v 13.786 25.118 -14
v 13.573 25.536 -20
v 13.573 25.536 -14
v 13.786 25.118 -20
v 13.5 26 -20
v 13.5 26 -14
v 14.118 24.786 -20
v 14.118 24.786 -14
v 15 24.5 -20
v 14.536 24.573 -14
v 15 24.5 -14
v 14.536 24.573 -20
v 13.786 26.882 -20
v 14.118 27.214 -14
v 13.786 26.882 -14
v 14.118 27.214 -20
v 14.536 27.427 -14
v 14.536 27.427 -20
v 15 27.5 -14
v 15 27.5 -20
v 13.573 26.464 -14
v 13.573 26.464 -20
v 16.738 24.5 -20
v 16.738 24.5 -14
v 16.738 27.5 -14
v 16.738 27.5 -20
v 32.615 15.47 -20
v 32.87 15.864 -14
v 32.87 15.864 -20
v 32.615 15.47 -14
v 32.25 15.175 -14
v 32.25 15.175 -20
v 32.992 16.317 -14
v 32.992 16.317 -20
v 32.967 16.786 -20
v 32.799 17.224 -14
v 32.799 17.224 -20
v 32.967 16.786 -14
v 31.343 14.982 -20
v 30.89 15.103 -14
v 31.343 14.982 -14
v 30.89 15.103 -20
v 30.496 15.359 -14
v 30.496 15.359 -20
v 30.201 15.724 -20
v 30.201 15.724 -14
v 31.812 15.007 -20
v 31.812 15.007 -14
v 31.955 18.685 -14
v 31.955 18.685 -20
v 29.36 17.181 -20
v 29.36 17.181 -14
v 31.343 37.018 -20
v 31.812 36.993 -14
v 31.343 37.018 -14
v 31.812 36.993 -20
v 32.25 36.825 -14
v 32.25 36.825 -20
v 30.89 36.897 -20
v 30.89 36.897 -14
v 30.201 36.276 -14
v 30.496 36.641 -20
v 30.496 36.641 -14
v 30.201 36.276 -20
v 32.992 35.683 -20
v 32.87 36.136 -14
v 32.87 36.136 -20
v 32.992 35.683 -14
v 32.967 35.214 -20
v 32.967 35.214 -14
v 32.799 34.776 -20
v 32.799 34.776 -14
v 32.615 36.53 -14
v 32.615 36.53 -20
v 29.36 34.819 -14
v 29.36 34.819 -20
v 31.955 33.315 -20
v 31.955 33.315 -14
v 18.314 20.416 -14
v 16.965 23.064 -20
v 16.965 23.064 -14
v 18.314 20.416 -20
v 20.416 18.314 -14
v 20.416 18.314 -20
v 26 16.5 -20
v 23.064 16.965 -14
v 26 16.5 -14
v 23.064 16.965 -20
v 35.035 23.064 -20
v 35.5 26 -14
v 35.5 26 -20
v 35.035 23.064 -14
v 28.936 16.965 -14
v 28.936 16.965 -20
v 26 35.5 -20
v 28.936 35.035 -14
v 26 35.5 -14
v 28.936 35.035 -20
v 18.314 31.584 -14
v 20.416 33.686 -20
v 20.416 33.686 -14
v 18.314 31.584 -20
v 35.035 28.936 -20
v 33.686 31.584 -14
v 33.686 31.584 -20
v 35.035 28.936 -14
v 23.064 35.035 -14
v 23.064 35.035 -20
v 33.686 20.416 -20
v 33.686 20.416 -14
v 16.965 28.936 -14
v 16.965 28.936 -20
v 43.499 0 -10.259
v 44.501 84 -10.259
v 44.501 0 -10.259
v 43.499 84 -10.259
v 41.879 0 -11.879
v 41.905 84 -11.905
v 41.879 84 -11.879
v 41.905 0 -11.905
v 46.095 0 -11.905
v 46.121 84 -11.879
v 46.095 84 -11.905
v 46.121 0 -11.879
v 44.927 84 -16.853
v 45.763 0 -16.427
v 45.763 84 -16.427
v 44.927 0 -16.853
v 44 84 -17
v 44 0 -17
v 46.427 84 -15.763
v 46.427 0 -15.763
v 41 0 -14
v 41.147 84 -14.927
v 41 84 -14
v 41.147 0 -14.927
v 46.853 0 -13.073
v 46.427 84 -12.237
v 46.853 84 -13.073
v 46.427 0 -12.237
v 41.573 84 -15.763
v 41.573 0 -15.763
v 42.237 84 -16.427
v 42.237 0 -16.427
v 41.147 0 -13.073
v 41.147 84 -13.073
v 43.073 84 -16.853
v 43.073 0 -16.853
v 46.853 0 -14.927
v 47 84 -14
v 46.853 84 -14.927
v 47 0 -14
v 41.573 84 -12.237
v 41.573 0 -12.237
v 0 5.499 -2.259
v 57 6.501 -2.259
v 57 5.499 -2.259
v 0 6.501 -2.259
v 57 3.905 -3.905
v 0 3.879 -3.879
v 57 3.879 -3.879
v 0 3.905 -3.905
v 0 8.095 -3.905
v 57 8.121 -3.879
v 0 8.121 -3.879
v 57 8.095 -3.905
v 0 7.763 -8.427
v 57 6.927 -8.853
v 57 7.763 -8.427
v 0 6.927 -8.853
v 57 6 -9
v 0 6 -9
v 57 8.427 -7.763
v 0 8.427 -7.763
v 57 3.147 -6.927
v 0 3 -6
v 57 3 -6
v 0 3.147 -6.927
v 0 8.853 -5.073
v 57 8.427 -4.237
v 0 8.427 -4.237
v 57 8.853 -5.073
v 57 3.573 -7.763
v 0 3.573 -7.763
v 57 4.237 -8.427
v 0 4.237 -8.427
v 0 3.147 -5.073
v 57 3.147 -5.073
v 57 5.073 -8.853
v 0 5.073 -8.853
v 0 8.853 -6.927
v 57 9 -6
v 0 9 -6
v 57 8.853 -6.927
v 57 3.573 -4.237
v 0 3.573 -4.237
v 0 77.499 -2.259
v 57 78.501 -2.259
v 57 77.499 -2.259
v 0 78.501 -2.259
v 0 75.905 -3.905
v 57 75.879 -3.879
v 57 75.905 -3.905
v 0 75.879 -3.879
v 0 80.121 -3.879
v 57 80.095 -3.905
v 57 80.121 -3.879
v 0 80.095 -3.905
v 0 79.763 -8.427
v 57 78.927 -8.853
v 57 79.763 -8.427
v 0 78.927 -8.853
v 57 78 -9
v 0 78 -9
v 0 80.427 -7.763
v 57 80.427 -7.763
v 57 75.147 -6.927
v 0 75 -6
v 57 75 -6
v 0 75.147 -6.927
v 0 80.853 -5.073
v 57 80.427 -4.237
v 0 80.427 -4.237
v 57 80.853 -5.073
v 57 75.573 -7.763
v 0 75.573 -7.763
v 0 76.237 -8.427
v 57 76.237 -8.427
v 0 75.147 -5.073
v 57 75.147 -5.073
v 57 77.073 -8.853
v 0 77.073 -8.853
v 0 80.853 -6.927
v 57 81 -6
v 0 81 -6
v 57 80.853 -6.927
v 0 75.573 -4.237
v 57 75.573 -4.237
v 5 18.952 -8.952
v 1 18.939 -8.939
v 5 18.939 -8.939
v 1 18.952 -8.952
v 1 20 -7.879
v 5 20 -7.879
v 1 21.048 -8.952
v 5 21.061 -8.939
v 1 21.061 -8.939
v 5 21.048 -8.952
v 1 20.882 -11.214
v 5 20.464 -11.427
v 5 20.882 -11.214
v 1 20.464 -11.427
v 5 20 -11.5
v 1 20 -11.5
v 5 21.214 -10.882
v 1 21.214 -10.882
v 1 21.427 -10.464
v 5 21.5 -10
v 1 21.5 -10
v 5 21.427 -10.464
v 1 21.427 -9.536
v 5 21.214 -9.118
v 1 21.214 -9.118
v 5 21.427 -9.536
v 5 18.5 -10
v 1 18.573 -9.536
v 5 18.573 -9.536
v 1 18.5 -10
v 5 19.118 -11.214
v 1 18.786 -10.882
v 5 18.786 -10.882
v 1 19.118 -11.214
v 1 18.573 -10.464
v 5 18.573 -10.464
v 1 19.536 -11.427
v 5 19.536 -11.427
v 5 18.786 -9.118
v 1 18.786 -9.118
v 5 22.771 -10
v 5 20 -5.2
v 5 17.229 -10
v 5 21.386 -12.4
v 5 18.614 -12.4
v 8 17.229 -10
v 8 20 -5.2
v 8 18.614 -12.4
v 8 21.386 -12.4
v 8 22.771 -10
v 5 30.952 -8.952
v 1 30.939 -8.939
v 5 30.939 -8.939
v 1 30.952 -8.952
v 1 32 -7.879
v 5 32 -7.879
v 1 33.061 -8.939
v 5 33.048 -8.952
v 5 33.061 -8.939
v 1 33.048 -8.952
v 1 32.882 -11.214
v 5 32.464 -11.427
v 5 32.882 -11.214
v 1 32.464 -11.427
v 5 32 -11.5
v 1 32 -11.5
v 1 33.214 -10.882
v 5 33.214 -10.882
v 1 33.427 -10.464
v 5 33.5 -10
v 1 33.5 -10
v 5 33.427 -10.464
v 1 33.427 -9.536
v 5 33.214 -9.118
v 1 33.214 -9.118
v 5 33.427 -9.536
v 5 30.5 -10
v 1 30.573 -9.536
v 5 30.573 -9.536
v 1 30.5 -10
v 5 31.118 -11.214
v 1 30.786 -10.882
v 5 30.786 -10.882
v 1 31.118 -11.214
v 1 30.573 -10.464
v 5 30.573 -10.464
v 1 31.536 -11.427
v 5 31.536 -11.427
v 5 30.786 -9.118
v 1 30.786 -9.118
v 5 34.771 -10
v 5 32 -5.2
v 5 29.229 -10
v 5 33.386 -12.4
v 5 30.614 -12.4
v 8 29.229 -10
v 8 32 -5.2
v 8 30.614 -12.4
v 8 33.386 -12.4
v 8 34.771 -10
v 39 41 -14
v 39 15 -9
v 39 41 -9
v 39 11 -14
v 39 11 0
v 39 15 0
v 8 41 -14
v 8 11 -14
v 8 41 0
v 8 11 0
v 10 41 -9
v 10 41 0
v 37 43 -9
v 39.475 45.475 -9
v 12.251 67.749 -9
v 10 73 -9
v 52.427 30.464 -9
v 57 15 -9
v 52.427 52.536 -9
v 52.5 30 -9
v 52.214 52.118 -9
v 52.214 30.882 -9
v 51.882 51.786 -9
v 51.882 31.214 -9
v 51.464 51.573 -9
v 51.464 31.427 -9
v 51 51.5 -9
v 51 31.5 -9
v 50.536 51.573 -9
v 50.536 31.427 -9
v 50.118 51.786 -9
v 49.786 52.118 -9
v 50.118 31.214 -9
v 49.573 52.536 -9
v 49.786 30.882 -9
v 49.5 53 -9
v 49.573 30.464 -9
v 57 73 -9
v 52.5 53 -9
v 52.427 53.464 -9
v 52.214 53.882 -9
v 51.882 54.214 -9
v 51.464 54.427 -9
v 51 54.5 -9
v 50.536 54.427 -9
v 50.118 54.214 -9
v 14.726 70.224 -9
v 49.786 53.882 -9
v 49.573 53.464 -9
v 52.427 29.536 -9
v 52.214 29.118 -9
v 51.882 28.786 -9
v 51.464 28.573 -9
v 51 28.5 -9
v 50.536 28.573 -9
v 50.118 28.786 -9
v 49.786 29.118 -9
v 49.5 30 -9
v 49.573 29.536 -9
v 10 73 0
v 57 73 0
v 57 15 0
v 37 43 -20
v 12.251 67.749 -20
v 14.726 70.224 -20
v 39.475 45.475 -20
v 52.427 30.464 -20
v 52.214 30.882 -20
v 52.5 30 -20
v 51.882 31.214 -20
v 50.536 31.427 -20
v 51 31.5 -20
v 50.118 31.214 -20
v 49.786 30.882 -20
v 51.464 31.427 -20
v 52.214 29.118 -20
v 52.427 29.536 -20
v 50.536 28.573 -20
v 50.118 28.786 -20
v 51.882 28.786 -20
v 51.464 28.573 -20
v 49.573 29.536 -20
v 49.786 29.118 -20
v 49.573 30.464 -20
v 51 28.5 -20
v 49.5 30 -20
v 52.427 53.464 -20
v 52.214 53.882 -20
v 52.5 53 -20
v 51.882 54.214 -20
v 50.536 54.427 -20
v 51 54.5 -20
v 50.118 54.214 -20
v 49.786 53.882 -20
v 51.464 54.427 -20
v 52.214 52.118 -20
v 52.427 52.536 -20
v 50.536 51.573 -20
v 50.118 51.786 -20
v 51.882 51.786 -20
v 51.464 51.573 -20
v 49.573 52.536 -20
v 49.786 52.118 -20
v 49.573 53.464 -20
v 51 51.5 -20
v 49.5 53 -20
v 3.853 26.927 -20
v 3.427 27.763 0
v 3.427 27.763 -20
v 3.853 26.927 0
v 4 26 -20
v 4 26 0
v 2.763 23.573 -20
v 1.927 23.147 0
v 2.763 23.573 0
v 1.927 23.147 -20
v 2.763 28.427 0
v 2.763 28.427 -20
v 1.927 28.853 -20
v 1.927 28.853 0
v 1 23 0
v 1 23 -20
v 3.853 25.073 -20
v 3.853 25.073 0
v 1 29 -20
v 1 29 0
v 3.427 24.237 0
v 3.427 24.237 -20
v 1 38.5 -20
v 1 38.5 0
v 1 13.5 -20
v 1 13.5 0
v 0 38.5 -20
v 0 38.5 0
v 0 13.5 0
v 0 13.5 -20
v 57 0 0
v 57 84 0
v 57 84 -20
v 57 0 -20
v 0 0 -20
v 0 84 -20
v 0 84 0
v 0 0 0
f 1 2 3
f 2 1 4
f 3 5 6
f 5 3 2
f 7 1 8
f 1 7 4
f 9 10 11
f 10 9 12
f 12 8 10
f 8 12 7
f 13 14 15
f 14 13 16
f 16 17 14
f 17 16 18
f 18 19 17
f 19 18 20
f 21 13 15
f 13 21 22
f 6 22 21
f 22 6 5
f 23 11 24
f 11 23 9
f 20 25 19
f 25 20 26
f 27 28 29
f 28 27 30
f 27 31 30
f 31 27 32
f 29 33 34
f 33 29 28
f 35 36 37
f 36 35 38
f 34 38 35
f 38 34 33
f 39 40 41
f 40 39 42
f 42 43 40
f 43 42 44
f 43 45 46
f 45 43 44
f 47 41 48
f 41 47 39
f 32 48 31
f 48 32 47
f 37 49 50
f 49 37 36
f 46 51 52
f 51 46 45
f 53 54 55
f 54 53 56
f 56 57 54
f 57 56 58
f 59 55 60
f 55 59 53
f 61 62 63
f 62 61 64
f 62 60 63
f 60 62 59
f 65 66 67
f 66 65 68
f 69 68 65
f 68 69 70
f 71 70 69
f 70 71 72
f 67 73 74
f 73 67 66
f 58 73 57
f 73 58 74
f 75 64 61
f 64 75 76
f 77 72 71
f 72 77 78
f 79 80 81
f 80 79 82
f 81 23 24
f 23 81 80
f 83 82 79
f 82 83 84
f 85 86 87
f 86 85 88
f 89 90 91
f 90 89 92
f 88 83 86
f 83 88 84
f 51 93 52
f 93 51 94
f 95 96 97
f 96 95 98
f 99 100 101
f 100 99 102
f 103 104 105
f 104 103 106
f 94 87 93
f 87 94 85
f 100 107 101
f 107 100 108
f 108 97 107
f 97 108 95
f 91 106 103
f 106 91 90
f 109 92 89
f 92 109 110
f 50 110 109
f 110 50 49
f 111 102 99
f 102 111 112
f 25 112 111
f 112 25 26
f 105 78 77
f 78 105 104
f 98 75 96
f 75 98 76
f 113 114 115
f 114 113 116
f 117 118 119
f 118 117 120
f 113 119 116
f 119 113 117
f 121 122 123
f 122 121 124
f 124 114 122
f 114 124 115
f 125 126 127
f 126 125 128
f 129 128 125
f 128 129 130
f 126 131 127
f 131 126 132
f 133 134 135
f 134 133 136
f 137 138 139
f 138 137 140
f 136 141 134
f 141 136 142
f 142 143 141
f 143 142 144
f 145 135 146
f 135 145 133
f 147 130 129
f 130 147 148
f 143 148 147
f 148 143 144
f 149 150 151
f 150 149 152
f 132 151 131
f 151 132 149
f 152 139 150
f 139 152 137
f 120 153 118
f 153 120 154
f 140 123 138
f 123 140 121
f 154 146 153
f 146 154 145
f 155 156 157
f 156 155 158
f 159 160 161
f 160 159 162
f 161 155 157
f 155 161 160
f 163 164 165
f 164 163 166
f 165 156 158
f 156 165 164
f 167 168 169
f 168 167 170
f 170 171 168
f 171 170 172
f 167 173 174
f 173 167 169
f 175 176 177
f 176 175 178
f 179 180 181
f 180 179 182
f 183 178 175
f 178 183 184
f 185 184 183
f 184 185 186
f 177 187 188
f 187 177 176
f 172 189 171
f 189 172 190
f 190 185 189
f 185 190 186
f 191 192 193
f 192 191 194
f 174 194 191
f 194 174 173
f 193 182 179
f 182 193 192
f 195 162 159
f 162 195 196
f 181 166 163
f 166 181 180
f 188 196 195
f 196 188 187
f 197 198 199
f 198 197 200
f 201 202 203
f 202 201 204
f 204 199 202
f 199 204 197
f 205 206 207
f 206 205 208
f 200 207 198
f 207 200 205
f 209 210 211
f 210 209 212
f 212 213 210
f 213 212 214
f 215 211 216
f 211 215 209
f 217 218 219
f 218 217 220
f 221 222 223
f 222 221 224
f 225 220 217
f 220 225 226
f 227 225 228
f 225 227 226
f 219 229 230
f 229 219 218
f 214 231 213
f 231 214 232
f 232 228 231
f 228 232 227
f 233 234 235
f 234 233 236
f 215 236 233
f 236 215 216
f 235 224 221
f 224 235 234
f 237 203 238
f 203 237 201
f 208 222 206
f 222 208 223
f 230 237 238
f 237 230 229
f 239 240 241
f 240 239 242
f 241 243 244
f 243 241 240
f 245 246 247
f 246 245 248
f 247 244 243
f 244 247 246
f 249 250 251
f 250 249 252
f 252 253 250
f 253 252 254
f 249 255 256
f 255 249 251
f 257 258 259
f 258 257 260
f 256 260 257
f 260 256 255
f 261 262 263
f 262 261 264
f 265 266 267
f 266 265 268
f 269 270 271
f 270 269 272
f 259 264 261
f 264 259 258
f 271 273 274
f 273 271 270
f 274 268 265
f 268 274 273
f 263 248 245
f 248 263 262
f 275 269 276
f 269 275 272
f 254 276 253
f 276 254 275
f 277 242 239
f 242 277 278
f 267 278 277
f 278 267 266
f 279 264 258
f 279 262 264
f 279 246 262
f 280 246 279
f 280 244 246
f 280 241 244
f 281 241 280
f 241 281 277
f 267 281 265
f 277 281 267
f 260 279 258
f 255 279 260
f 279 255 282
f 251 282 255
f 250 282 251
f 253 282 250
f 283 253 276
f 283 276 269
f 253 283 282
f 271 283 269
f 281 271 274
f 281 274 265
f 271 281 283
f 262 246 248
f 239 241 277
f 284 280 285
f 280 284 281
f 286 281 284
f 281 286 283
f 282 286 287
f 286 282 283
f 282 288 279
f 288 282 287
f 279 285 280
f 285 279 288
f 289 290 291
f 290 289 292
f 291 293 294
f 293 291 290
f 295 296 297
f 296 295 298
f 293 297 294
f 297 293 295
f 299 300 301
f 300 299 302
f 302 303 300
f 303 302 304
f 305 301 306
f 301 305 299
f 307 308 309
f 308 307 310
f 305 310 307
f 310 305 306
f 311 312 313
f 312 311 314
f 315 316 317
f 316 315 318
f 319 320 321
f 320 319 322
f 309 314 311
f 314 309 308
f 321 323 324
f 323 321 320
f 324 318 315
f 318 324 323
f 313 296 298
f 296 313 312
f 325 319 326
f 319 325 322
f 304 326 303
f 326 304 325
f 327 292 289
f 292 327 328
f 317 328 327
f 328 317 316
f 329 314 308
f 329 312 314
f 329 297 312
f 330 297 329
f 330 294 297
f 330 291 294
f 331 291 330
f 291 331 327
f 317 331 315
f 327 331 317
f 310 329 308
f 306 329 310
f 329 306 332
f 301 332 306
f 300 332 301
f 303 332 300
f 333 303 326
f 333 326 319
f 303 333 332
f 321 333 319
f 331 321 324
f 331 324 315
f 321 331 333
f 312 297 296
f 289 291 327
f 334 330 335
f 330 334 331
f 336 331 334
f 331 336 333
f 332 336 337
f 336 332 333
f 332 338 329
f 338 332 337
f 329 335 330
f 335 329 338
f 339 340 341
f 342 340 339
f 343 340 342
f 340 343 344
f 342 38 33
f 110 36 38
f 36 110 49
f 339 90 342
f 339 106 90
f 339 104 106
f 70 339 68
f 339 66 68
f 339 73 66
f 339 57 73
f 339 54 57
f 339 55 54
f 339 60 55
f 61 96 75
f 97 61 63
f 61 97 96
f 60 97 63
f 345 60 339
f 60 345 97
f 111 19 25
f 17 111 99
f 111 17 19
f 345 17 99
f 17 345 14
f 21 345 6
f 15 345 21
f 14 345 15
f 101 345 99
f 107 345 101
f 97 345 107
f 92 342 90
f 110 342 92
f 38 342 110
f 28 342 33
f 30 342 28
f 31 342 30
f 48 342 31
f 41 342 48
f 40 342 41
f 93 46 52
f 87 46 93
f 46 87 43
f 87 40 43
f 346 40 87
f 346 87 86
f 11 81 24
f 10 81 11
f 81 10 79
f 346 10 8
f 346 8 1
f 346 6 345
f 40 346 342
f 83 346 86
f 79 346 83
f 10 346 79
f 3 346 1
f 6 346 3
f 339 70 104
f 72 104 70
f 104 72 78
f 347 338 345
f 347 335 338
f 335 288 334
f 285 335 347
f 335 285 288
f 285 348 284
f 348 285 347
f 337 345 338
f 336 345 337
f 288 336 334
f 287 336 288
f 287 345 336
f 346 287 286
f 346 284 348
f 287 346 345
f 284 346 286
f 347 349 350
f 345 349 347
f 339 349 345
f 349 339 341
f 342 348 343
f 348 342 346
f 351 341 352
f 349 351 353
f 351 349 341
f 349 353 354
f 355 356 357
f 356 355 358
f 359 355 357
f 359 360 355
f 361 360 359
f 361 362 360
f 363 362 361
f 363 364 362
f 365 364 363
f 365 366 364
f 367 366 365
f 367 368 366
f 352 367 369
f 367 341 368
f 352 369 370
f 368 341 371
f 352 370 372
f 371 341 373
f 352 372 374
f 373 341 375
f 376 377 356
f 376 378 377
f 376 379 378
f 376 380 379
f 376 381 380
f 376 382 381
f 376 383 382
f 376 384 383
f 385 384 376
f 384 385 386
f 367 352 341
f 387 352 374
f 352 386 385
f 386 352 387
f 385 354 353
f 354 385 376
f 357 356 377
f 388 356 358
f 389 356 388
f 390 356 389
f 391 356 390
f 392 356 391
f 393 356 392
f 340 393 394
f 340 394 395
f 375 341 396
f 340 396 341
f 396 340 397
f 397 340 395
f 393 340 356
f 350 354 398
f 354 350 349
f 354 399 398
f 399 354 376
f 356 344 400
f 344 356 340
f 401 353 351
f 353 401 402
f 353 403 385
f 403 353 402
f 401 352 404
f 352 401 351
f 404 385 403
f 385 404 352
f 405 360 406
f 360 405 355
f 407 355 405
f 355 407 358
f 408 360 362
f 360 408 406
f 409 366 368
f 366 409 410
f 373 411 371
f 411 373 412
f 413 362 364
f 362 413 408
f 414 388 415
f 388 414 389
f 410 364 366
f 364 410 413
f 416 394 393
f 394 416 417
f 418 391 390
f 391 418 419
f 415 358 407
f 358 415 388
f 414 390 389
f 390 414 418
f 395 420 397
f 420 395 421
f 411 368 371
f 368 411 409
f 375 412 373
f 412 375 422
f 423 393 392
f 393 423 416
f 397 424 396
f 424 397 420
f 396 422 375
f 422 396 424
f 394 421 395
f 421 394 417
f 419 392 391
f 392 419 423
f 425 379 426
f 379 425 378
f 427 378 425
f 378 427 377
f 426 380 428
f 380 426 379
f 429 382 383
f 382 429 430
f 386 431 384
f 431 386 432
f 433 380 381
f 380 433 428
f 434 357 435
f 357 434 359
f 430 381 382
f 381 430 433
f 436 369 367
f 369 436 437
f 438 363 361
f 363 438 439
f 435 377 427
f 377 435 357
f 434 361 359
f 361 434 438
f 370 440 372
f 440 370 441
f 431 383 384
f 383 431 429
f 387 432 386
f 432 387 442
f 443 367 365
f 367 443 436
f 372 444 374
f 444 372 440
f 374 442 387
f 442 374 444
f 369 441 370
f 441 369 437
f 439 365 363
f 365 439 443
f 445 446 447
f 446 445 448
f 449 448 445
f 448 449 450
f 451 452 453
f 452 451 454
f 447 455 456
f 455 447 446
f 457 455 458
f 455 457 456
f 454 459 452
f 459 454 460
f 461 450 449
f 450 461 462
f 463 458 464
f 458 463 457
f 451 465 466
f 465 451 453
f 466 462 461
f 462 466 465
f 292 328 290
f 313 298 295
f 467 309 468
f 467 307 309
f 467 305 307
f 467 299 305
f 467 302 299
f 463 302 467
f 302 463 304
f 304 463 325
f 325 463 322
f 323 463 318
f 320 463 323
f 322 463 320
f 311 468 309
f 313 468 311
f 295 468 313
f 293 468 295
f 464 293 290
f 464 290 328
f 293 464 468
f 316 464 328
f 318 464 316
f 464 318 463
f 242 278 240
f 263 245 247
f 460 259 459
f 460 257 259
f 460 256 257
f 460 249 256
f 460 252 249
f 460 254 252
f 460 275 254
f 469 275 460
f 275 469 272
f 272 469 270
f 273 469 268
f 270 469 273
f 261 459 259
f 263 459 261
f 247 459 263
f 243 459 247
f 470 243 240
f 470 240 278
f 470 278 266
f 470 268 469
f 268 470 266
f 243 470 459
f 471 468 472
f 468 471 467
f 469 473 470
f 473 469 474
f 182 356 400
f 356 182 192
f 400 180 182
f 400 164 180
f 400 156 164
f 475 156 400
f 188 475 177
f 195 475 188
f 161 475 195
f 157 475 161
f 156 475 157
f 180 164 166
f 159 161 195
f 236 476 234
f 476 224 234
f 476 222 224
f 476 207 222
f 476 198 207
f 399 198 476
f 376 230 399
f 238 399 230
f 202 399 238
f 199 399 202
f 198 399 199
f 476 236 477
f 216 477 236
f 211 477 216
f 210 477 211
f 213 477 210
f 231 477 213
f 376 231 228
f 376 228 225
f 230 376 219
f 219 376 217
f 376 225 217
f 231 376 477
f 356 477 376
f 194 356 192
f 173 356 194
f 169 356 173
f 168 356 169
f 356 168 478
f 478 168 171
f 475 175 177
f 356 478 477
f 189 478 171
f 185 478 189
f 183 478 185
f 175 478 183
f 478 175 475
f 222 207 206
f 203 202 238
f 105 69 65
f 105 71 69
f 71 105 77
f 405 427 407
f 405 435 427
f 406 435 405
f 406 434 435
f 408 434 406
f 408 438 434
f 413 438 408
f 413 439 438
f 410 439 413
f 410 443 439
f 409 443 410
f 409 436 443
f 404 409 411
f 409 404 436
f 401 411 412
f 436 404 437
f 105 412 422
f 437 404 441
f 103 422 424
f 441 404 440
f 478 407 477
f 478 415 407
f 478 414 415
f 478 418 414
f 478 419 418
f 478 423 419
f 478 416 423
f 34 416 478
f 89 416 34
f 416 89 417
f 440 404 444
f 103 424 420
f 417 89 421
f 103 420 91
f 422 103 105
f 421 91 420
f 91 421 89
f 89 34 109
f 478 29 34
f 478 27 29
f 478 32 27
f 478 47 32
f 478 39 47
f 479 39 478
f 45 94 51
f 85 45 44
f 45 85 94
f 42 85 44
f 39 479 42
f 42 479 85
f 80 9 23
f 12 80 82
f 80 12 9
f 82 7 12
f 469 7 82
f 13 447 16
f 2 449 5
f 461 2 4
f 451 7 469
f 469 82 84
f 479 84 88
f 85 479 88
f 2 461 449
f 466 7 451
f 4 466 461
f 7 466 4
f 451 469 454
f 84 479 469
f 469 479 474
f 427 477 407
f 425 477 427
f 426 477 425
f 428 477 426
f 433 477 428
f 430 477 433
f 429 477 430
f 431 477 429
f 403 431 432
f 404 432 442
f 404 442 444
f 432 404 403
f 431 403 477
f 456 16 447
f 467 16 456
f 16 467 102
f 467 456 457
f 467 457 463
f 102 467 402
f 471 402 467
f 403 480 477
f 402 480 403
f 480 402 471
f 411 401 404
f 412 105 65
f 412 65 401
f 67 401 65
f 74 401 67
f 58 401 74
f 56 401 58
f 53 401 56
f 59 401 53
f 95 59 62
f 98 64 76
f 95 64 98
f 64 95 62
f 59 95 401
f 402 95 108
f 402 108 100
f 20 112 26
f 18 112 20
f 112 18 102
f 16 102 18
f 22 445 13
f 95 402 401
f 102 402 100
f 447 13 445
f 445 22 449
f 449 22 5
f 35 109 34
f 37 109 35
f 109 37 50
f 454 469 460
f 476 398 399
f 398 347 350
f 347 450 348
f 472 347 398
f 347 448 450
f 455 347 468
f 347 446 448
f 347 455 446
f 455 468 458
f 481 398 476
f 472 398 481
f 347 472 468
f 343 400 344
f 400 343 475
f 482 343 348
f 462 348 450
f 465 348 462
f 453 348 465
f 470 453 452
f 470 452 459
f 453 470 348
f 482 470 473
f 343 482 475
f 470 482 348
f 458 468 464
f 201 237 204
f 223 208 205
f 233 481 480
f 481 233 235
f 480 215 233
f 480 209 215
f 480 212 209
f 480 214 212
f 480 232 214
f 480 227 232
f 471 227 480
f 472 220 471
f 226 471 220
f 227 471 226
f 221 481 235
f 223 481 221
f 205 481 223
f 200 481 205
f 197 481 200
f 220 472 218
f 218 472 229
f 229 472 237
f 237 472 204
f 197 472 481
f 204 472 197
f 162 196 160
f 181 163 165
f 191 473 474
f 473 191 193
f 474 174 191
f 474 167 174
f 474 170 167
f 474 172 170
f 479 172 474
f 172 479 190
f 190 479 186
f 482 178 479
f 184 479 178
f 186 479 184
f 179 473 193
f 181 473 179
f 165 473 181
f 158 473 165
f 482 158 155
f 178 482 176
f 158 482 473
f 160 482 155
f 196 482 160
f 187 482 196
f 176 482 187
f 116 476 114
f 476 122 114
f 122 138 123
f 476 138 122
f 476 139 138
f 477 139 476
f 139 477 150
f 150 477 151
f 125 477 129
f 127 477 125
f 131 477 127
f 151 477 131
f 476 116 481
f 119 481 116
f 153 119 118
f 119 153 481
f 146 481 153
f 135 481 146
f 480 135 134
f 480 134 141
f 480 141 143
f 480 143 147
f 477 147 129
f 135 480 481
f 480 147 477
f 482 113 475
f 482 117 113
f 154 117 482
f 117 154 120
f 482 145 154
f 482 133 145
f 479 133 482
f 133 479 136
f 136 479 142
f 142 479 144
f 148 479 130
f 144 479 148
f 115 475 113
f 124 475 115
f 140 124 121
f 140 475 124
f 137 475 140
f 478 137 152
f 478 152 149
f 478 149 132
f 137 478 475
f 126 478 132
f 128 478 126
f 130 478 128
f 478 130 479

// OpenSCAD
// file: library.scad
include <parameters.scad>;


// inner and outer product.  Why aren't these standard?!!!?

function ip(v1 = [0,0,0], v2 = [0,0,0]) = v1.x*v2.x + v1.y*v2.y + v1.z*v2.z;

function op(v1 = [0,0,0], v2 = [0,0,0]) = [v1.y*v2.z - v1.z*v2.y, v1.z*v2.x - v1.x*v2.z, v1.x*v2.y - v1.y*v2.x];

module nema14()
{
	color([1,0.4,0.4,1])
	union()
	{
		translate([0, 0, nema14_shaft_length/2 - nema14_shaft_projection - nema14_hub_depth])
			cylinder(r = nema14_shaft/2, h = nema14_shaft_length, center = true, $fn=20);
		translate([0, 0, -nema14_hub_depth])
			cylinder(r = nema14_hub/2, h = nema14_hub_depth*2, center = true, $fn=20);
		translate([0, 0, nema14_length/2])
			cube([nema14_square,nema14_square,nema14_length], center = true);
		union()
		{
			for ( x = [0:1] ) 
			for ( y = [0:1] )
			{
				translate([(x-0.5)*nema14_screws, (y-0.5)*nema14_screws, 0])
					cylinder(r = screwsize/2, h = 30, center = true, $fn=10);
			}
		}
	}


}

// Pentagon nut that matches a hexagon...

module pentanut(height=40)
{
	rotate([0,0,60])
	intersection()
	{
		translate([-nutsize,-nutsize*5,-20])
			cube([nutsize*10, nutsize*10,height]);
		rotate([0,0,60])
			translate([-nutsize,-nutsize*5,-20])
				cube([nutsize*10, nutsize*10,height]);
		rotate([0,0,120])
			translate([-nutsize,-nutsize*5,-20])
				cube([nutsize*10, nutsize*10,height]);
		rotate([0,0,180])
			translate([-nutsize,-nutsize*5,-20])
				cube([nutsize*10, nutsize*10,height]);
		rotate([0,0,240])
			translate([-nutsize,-nutsize*5,-20])
				cube([nutsize*10, nutsize*10,height]);
	}
}


// Make a RepRap teardrop with its axis along Z
// If truncated is true, chop the apex; if not, come to a point

// I stole this function from Erik...


module teardrop(radius, height, truncateMM)
{
	union()
	{
		if(truncateMM > 0)
		{
			intersection()
			{
				translate([truncateMM,0,height/2]) 
					scale([1,1,height])
						cube([radius*2.8275,radius*2,1],center=true);
				scale([1,1,height]) 
						rotate([0,0,3*45])
							cube([radius,radius,1]);
			}
		} else
		{
			scale([1,1,height])
				rotate([0,0,3*45])
					cube([radius,radius,1]);
		}
		cylinder(r=radius, h = height, $fn=20);
	}
}


// Make a ball-bearing holder cutout

module bearing_holder(radius = 6.5)
{
	union()
	{
		cylinder (h = radius*5, r = radius, center = true, $fn = 20);
		for(i=[0:2])
		{
			rotate([0,0,120*i])
				translate([radius+screwsize/2, 0, 0])
					union()
					{
						cylinder (h = radius*5, r = screwsize/2, center = true, $fn = 20);
						translate([-screwsize, 0, 0])
							cube([2*screwsize, screwsize, radius*5], center = true);
					}
		}
	}
}

// Make a cuboid with a 45 degree top for vertical slots etc

module cen_hat(size)
{
	translate([0, 0, size.x/sqrt(2)])
		union()
		{
			rotate([0, 45, 0])
				cube([size.x, size.y, 5*max(size.x, max(size.y, size.z))], center=true);
			rotate([0, -45, 0])
				cube([size.x, size.y, 5*max(size.x, max(size.y, size.z))], center=true);
		}
}

module hat_cube(size = [1,1,1], center = false)
{
	difference()
	{
		cube(size, center);
		if(center)
			translate([0, 0, size.z/2])
				cen_hat(size);
		else
			translate([size.x/2, size.y/2, size.z])
				cen_hat(size);
	}
}



module rod(length, threaded) if (threaded && renderrodthreads) {
	linear_extrude(height = length, center = true, convexity = 10, twist = -360 * length / rodpitch, $fn = fn)
		translate([rodsize * 0.1 / 2, 0, 0])
			circle(r = rodsize * 0.9 / 2, $fn = fn);
} else cylinder(h = length, r = rodsize / 2, center = true, $fn = fn);


module rodnut(position, washer) render() translate([0, 0, position]) {
	intersection() {
		scale([1, 1, 0.5]) sphere(r = 1.05 * rodsize, center = true);
		difference() {
			cylinder (h = rodnutsize, r = rodnutdiameter / 2, center = true, $fn = 6);
			rod(rodnutsize + 0.1);
		}
	}
	if (washer == 1 || washer == 4) rodwasher(((position > 0) ? -1 : 1) * (rodnutsize + rodwashersize) / 2);
	if (washer == 2 || washer == 4) rodwasher(((position > 0) ? 1 : -1) * (rodnutsize + rodwashersize) / 2);
}


module rodwasher(position) render() translate ([0, 0, position]) difference() {
	cylinder(r = rodwasherdiameter / 2, h = rodwashersize, center = true, $fn = fn);
	rod(rodwashersize + 0.1);
}


module screw(length, nutpos, washer, bearingpos = -1) union(){
	translate([0, 0, -length / 2]) if (renderscrewthreads) {
		linear_extrude(height = length, center = true, convexity = 10, twist = -360 * length / screwpitch, $fn = fn)
			translate([screwsize * 0.1 / 2, 0, 0])
				circle(r = screwsize * 0.9 / 2, $fn = fn);
	} else cylinder(h = length, r = screwsize / 2, center = true, $fn = fn);
	render() difference() {
		translate([0, 0, screwsize / 2]) cylinder(h = screwsize, r = screwsize, center = true, $fn = fn);
		translate([0, 0, screwsize]) cylinder(h = screwsize, r = screwsize / 2, center = true, $fn = 6);
	}
	if (washer > 0 && nutpos > 0) {
		washer(nutpos);
		nut(nutpos + washersize);
	} else if (nutpos > 0) nut(nutpos);
	if (bearingpos >= 0) bearing(bearingpos);
}


module bearing(position) render() translate([0, 0, -position - bearingwidth / 2]) union() {
	difference() {
		cylinder(h = bearingwidth, r = bearingsize / 2, center = true, $fn = fn);
		cylinder(h = bearingwidth * 2, r = bearingsize / 2 - 1, center = true, $fn = fn);
	}
	difference() {
		cylinder(h = bearingwidth - 0.5, r = bearingsize / 2 - 0.5, center = true, $fn = fn);
		cylinder(h = bearingwidth * 2, r = screwsize / 2 + 0.5, center = true, $fn = fn);
	}
	difference() {
		cylinder(h = bearingwidth, r = screwsize / 2 + 1, center = true, $fn = fn);
		cylinder(h = bearingwidth + 0.1, r = screwsize / 2, center = true, $fn = fn);
	}
}


module nut(position, washer) render() translate([0, 0, -position - nutsize / 2]) {
	intersection() {
		scale([1, 1, 0.5]) sphere(r = 1.05 * screwsize, center = true);
		difference() {
			cylinder (h = nutsize, r = nutdiameter / 2, center = true, $fn = 6);
			cylinder(r = screwsize / 2, h = nutsize + 0.1, center = true, $fn = fn);
		}
	}
	if (washer > 0) washer(0);
}


module washer(position) render() translate ([0, 0, -position - washersize / 2]) difference() {
	cylinder(r = washerdiameter / 2, h = washersize, center = true, $fn = fn);
	cylinder(r = screwsize / 2, h = washersize + 0.1, center = true, $fn = fn);
}


//rod(20);
//translate([rodsize * 2.5, 0, 0]) rod(20, true);
//translate([rodsize * 5, 0, 0]) screw(10, true);
//translate([rodsize * 7.5, 0, 0]) bearing();
//translate([rodsize * 10, 0, 0]) rodnut();
//translate([rodsize * 12.5, 0, 0]) rodwasher();
//translate([rodsize * 15, 0, 0]) nut();
//translate([rodsize * 17.5, 0, 0]) washer();

//hat_cube(size=[2,40,2], center=false);

//bearing_holder();

pentanut();
// file: parameters.scad
// Parameters file for RepRap Huxley

pi=3.14159265;

// The relative location in your file system where the .dxf files are
// DXFs are for quick development.  They should be replaced by parameterised CSG in dure course.

fileroot="DXF-files/";

rodsize = 6;	//threaded/smooth rod diameter in mm
xaxis = 182.5;	//width of base in mm
yaxis = 266.5;	//length of base in mm


screwsize = 3;	//bearing bore/screw diameter in mm
bearingsize = 10;	//outer diameter of bearings in mm
bearingwidth = 4;	//width of bearings in mm


rodpitch = rodsize / 6;
rodnutsize = 0.8 * rodsize;
rodnutdiameter = 1.9 * rodsize;
rodwashersize = 0.2 * rodsize;
rodwasherdiameter = 2 * rodsize;
screwpitch = screwsize / 6;
nutsize = 0.8 * screwsize;
nutdiameter = 1.9 * screwsize;
washersize = 0.2 * screwsize;
washerdiameter = 2 * screwsize;
partthick = 2 * rodsize;
vertexrodspace = 2 * rodsize;


c = [0.3, 0.3, 0.3];
rodendoffset = rodnutsize + rodwashersize * 2 + partthick / 2;
vertexoffset = vertexrodspace + rodendoffset;


renderrodthreads = false;
renderscrewthreads = false;
fn = 36;

// The gap between the joining rods at a vertex

vertex_radius=sqrt(rodsize*rodsize + vertexoffset*vertexoffset);
vertex_ang = atan(vertexoffset/rodsize)-30;
vertex_gap = 2*vertex_radius*cos(vertex_ang);

// Nema 14 dimensions - these are absolute

nema14_square=35.3;
nema14_screws=26;
nema14_hub=22;
nema14_hub_depth=2;
nema14_length=36;
nema14_shaft=5;
nema14_shaft_length=66;
nema14_shaft_projection=19;

// The RepRap slide bearings

bearing_mount_centres=18;
bearing_width=7;

// X axis parameters - many should be relative

motor_center_y = 26;
bar_clamp_x=5;
bar_clamp_y=8;
bar_clamp_x_gap=23;
bearing_y=50;
bearing_x=bar_clamp_x_gap + 10;
hole_land=4;
thickness=5;
bearing_low_z = 8;
bearing_z_gap = 25;
bearing_plate_width = bearing_mount_centres+2*hole_land + 10;
bearing_plate_overlap=0.5;
bearing_plate_support=10;
// main file
include <parameters.scad>;
use <library.scad>;

zax= 57;
zay = 84;
zaz=20;

//import_stl("../z-leadscrew-base-motor_2.stl", convexity = 7);


module z_axis_motor_base()
{
	mirror([0,0,1])
		difference()
		{
			// Starting block

			cube([zax,zay,zaz]);

			// Holes in it - colour them so we can distinguish them

			color([0.4,0.4,1,1])
			{

// Body cavity

				//translate([-6,45,-40])
					//cube([35,50,130]);
				translate([8,11,-16])
					cube([31,30,30]);
				//translate([39,44,-16])
					//cube([12,30,30]);
				//translate([39,20,-16])
					//cube([12,13,30]);
				translate([10,15,-6])
					cube([70,58,15]);

// The adjuster slot

				translate([37,43,-40])
					rotate([0,0,45])
						cube([3.5,35,130]);
				
				
// The bearing holder

				translate([26,26,0])
					rotate([0,0,180])
						bearing_holder(radius=9.5);
				
// Vertical M3 screw holes

				//translate([12,14,0])
					//cylinder(r=screwsize/2,h=zay,center=true,$fn=20);
				translate([51,30,0])
					cylinder(r=screwsize/2,h=zay,center=true,$fn=20);
				translate([51,53,0])
					cylinder(r=screwsize/2,h=zay,center=true,$fn=20); 

// The Z rod notch

				translate([1,26,0])
					cylinder(r=rodsize/2,h=zay,center=true,$fn=20); 
				
// The M6 rod in the triangle frame

				translate([44,-10,14])
					rotate([0,-90,0])
						rotate([-90,0,0])
							teardrop(radius=rodsize/2,height=zay*2,truncateMM=0.5);
		
// The M6 strengthening rods that run across
		
				translate([zax+10,6,6])
					rotate([0,-90,0])
						teardrop(radius=rodsize/2,height=zay*2,truncateMM=0.5);
				
				translate([zax+10,78,6])
					rotate([0,-90,0])
						teardrop(radius=rodsize/2,height=zay*2,truncateMM=0.5);
				
//  Z-rod clamp M3 holes

				translate([20,20,10])
					rotate([0,-90,0])
					{
						teardrop(radius=screwsize/2,height=zay*2,truncateMM=0);
						translate([0,0,25])
						pentanut(10);
					}
				
				translate([20,32,10])
					rotate([0,-90,0])
					{
						teardrop(radius=screwsize/2,height=zay*2,truncateMM=0);
						translate([0,0,25])
						pentanut(10);
					}
				
// Z clamp notch

				translate([0,26,10])
					cube([2,25,40], center=true);
			}
		}
}

z_axis_motor_base();
